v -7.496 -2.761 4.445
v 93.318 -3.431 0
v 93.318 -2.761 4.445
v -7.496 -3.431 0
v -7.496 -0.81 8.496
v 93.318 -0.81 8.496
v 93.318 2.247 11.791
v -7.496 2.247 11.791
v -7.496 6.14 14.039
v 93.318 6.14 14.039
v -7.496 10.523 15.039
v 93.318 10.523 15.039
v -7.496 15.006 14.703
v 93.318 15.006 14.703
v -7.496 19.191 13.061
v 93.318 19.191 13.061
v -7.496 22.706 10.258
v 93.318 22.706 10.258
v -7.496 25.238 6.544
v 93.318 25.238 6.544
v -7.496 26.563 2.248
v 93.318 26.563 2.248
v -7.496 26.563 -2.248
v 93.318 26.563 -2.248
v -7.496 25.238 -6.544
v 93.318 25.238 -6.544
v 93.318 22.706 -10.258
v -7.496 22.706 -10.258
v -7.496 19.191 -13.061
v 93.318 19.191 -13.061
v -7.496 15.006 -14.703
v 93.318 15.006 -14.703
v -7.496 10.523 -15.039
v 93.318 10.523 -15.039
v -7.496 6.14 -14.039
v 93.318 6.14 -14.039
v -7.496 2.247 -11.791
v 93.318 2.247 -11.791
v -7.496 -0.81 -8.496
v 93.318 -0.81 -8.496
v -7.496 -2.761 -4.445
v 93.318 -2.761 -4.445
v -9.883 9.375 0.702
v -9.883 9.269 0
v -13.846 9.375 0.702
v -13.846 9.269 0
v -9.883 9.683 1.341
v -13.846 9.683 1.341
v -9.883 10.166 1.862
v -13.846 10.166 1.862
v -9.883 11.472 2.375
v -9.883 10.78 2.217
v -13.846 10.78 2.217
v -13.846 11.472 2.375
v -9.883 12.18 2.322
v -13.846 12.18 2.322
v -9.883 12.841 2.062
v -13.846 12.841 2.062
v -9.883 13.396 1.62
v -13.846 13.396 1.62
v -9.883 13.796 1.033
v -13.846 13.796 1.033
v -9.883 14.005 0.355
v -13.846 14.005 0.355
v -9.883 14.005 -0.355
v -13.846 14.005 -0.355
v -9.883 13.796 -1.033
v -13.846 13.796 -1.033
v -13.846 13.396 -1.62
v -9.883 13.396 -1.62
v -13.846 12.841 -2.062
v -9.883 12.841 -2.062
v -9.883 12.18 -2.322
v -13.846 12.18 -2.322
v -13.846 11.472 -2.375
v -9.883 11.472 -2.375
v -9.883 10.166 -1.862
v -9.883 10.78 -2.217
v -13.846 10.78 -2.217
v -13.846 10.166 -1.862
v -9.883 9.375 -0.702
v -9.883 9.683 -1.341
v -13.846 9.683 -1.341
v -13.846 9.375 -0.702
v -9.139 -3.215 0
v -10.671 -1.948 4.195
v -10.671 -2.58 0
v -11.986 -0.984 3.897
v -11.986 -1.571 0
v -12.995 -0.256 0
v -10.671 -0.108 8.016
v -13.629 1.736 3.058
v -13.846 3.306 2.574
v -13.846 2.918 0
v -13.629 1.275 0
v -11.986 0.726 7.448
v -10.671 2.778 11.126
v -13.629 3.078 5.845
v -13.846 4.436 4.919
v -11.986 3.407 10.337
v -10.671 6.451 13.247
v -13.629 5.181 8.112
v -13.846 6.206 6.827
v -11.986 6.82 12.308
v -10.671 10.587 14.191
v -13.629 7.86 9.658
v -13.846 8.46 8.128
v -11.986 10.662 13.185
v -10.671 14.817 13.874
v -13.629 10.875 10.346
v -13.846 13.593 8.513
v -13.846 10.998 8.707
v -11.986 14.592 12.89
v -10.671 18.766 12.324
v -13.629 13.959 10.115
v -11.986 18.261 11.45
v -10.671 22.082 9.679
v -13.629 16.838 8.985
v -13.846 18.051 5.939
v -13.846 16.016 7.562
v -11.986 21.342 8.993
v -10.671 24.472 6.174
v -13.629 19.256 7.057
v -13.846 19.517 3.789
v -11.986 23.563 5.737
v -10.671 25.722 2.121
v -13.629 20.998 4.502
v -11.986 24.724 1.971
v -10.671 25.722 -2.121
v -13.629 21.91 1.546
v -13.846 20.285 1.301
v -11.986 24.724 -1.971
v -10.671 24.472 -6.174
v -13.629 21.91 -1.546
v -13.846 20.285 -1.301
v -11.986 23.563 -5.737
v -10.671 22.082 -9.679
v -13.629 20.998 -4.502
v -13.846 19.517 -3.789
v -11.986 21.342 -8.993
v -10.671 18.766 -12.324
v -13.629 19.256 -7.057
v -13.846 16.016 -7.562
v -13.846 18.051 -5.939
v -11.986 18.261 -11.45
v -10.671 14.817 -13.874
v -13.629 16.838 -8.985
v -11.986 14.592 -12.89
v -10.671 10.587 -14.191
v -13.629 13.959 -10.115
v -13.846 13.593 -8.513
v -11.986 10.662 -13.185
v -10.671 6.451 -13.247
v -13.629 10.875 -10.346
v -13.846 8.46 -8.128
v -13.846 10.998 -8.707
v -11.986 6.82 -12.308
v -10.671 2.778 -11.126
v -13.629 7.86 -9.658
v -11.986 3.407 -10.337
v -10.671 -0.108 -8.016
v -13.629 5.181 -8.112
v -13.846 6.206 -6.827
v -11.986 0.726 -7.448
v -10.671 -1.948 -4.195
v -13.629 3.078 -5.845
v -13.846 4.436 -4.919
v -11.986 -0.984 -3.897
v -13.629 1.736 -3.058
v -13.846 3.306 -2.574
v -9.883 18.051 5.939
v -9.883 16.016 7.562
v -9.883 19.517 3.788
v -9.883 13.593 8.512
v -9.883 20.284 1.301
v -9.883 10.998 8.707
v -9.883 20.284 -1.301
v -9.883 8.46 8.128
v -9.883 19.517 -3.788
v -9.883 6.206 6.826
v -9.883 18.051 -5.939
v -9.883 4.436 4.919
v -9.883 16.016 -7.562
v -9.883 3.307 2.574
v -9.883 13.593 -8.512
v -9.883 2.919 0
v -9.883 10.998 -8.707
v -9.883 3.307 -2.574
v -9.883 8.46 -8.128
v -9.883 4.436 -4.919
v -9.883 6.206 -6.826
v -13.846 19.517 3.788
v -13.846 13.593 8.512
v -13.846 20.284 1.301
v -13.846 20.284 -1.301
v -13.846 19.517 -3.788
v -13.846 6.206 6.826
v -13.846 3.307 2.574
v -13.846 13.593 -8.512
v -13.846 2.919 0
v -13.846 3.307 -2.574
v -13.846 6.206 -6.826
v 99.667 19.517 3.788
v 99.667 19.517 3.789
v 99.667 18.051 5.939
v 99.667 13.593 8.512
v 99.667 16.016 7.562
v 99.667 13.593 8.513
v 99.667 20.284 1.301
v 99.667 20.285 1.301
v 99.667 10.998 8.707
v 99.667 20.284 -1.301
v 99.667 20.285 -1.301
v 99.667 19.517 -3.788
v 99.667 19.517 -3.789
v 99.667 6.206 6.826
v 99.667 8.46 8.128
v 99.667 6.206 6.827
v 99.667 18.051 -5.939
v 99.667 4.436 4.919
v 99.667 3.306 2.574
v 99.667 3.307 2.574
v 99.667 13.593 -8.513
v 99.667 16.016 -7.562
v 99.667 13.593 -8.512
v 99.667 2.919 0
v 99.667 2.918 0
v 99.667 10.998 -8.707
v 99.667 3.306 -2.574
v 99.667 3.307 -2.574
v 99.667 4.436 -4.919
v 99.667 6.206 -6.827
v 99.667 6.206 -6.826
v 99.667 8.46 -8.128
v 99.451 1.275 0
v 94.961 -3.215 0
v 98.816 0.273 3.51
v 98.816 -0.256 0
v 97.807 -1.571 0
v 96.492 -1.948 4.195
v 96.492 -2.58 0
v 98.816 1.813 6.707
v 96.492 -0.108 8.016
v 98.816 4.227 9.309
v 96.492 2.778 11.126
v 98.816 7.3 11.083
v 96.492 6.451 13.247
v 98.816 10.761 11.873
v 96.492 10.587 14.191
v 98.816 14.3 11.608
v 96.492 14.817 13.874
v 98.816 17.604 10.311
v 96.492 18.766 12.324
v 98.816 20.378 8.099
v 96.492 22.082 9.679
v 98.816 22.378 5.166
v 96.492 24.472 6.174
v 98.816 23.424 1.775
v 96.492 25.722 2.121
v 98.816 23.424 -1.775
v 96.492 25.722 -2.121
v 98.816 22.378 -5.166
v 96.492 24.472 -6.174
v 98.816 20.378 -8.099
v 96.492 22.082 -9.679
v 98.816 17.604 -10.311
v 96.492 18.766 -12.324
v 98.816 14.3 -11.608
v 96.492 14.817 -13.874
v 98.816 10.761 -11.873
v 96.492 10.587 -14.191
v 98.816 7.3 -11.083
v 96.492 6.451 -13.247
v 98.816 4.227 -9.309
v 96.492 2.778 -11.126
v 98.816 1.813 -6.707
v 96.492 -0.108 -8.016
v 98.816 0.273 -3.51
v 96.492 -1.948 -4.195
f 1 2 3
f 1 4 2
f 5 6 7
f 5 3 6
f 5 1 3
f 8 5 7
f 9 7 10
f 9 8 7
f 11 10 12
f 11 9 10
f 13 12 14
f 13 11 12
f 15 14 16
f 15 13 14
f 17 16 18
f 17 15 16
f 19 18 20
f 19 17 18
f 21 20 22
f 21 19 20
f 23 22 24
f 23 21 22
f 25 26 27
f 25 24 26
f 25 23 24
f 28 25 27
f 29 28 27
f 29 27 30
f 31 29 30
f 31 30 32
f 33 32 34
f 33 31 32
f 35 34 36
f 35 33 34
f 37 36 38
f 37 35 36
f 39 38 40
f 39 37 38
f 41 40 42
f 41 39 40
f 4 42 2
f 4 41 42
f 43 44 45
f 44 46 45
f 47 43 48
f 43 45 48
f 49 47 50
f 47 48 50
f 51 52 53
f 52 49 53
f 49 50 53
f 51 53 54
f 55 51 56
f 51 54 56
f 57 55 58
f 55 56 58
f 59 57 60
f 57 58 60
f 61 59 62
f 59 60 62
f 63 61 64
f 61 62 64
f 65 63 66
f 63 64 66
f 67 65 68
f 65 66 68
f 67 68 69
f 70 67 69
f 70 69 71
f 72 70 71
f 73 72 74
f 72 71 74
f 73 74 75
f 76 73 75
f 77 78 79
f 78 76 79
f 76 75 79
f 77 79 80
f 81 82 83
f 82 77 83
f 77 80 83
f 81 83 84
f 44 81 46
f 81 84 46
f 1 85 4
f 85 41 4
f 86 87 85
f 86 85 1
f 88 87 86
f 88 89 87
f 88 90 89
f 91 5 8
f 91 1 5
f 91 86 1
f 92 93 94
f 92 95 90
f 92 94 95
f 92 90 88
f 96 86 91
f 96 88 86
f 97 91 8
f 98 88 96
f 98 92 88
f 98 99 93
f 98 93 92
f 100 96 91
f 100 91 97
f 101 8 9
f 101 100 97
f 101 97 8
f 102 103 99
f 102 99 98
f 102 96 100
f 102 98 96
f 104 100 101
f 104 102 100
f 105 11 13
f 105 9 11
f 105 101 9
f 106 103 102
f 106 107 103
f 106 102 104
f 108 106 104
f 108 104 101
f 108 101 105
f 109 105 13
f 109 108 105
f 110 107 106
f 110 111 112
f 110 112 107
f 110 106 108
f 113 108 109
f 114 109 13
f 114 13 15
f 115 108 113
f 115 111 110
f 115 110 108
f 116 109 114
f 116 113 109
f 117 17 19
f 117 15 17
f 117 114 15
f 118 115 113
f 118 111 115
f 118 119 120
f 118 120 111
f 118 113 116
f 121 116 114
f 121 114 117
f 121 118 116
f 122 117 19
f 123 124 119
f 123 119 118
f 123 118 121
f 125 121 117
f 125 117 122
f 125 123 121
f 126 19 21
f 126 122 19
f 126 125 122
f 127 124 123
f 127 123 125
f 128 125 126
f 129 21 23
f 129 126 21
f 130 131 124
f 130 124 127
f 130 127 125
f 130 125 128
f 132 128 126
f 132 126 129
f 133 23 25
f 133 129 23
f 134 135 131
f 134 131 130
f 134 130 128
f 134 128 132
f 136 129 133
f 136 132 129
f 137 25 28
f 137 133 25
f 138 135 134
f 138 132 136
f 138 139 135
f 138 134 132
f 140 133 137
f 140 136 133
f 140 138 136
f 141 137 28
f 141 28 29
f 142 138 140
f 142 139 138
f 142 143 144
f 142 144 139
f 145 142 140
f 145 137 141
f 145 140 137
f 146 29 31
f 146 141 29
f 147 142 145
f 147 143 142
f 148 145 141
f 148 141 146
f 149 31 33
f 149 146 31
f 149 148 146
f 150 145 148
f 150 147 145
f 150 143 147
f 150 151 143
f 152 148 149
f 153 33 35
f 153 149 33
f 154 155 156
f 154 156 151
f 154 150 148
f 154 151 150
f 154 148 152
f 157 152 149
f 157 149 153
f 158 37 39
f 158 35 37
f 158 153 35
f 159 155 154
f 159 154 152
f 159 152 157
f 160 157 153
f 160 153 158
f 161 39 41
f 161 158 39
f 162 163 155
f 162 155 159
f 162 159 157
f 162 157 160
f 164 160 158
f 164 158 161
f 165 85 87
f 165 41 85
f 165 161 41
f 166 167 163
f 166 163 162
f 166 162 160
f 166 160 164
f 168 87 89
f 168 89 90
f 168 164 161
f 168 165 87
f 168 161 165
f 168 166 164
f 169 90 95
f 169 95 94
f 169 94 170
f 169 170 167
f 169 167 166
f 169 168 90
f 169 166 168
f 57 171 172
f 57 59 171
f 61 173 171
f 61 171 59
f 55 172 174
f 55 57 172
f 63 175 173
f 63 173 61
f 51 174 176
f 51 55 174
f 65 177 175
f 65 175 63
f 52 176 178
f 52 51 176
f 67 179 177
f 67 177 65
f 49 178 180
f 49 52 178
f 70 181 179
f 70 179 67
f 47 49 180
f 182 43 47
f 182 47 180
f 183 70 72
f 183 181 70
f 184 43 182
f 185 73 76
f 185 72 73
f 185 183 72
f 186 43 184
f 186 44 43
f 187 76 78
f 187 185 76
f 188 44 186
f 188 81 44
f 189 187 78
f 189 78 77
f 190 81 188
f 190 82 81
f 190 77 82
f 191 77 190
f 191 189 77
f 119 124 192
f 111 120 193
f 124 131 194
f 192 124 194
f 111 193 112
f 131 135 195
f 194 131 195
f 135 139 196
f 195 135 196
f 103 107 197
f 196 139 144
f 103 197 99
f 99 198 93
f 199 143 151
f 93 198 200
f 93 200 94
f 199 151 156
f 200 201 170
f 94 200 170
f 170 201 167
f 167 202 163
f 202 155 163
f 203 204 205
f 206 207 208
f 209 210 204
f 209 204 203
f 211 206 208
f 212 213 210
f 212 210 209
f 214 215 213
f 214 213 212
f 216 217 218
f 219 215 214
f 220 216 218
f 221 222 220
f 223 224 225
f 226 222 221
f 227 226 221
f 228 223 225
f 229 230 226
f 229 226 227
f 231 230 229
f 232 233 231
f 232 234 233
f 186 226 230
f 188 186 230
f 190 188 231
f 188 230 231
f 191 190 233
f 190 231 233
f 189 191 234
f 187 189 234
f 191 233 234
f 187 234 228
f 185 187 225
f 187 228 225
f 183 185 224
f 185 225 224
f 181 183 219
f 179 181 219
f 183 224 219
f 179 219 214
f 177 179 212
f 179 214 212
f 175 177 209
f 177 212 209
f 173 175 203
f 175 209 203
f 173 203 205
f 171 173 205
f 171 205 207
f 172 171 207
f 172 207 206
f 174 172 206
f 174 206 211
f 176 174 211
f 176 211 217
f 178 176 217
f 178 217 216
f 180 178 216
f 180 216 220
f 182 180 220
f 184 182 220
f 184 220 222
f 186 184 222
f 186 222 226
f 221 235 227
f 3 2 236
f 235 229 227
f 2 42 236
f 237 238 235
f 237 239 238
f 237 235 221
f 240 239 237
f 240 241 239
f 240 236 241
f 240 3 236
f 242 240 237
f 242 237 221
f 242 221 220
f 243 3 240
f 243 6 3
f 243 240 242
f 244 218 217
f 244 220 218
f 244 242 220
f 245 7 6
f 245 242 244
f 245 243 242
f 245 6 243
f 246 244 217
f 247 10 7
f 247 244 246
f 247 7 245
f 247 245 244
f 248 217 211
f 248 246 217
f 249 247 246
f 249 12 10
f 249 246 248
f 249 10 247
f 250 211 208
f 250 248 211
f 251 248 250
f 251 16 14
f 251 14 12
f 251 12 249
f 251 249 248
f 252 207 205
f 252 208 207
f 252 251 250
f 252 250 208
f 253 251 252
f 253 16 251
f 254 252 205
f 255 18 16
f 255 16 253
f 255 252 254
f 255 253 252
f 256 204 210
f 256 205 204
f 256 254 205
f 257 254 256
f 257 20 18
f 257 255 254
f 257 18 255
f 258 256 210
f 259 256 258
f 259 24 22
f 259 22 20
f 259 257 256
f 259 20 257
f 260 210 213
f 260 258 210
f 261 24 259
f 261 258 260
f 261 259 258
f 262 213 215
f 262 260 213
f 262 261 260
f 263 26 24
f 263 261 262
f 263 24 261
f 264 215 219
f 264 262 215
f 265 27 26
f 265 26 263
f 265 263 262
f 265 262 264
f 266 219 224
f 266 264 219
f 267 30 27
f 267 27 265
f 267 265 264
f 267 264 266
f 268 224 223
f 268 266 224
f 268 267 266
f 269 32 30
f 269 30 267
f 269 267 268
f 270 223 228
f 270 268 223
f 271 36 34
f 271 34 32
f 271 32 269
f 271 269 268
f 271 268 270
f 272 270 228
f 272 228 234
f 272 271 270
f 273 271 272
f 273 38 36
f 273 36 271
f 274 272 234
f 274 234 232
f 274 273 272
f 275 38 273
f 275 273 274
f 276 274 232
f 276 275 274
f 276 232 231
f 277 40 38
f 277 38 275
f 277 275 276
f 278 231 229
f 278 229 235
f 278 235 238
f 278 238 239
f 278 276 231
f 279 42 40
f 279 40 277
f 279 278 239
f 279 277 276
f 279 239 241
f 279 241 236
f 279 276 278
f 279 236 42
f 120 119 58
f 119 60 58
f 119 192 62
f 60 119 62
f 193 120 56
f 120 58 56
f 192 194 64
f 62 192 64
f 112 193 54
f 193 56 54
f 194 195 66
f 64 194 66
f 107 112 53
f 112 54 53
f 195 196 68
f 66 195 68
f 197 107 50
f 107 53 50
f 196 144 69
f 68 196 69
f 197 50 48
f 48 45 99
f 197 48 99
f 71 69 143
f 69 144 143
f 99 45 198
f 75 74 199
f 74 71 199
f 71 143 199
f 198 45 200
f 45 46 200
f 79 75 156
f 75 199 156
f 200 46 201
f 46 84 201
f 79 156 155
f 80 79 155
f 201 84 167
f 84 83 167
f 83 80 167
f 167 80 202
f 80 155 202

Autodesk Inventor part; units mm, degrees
ref_plane "YZ Plane" through (0, 0, 0) normal (1, 0, 0) x (0, 1, 0)
ref_plane "XZ Plane" through (0, 0, 0) normal (0, 1, 0) x (-1, 0, 0)
ref_plane "XY Plane" through (0, 0, 0) normal (0, 0, 1) x (1, 0, 0)
sketch "Sketch2" plane through (0, 0, 0) normal (0, 0, 1) x (1, 0, 0)
  line L0 (99.6671, 2.919) -> (99.6671, -3.431)
  line L1 (99.6671, -3.431) -> (-13.8455, -3.431)
  line L2 (-13.8455, -3.431) -> (-13.8455, 2.919)
  line L3 (-9.8831, 2.919) -> (-9.8831, 9.269)
  line L4 (-9.8831, 9.269) -> (-13.8455, 9.269)
  line L5 (-13.8455, 9.269) -> (-13.8455, 2.919)
  line L6 (-9.8831, 2.919) -> (99.6671, 2.919)
  line L7 (-13.8455, 11.6503) -> (99.6671, 11.6503)
  point P0 (0, 0)
  dimension "d17" = 113.5126
  dimension "d18" = 6.35
  dimension "d19" = 3.9624
  dimension "d20" = 6.35
  dimension "d24" = 6.35
  dimension "d25" = 6.35
  dimension "d26" = 113.5126
  dimension "d27" = 2.3813
revolve "Revolution1" add sketch "Sketch2" angle 360 about axis through (-13.8455, 11.6503, 0) along (1, 0, 0)
fillet "Fillet3" radius 6.35 2 edges at (99.6671, 26.7315, 0) (-13.8455, 26.7315, 0)
properties part number "rubberhandlesleeve"
